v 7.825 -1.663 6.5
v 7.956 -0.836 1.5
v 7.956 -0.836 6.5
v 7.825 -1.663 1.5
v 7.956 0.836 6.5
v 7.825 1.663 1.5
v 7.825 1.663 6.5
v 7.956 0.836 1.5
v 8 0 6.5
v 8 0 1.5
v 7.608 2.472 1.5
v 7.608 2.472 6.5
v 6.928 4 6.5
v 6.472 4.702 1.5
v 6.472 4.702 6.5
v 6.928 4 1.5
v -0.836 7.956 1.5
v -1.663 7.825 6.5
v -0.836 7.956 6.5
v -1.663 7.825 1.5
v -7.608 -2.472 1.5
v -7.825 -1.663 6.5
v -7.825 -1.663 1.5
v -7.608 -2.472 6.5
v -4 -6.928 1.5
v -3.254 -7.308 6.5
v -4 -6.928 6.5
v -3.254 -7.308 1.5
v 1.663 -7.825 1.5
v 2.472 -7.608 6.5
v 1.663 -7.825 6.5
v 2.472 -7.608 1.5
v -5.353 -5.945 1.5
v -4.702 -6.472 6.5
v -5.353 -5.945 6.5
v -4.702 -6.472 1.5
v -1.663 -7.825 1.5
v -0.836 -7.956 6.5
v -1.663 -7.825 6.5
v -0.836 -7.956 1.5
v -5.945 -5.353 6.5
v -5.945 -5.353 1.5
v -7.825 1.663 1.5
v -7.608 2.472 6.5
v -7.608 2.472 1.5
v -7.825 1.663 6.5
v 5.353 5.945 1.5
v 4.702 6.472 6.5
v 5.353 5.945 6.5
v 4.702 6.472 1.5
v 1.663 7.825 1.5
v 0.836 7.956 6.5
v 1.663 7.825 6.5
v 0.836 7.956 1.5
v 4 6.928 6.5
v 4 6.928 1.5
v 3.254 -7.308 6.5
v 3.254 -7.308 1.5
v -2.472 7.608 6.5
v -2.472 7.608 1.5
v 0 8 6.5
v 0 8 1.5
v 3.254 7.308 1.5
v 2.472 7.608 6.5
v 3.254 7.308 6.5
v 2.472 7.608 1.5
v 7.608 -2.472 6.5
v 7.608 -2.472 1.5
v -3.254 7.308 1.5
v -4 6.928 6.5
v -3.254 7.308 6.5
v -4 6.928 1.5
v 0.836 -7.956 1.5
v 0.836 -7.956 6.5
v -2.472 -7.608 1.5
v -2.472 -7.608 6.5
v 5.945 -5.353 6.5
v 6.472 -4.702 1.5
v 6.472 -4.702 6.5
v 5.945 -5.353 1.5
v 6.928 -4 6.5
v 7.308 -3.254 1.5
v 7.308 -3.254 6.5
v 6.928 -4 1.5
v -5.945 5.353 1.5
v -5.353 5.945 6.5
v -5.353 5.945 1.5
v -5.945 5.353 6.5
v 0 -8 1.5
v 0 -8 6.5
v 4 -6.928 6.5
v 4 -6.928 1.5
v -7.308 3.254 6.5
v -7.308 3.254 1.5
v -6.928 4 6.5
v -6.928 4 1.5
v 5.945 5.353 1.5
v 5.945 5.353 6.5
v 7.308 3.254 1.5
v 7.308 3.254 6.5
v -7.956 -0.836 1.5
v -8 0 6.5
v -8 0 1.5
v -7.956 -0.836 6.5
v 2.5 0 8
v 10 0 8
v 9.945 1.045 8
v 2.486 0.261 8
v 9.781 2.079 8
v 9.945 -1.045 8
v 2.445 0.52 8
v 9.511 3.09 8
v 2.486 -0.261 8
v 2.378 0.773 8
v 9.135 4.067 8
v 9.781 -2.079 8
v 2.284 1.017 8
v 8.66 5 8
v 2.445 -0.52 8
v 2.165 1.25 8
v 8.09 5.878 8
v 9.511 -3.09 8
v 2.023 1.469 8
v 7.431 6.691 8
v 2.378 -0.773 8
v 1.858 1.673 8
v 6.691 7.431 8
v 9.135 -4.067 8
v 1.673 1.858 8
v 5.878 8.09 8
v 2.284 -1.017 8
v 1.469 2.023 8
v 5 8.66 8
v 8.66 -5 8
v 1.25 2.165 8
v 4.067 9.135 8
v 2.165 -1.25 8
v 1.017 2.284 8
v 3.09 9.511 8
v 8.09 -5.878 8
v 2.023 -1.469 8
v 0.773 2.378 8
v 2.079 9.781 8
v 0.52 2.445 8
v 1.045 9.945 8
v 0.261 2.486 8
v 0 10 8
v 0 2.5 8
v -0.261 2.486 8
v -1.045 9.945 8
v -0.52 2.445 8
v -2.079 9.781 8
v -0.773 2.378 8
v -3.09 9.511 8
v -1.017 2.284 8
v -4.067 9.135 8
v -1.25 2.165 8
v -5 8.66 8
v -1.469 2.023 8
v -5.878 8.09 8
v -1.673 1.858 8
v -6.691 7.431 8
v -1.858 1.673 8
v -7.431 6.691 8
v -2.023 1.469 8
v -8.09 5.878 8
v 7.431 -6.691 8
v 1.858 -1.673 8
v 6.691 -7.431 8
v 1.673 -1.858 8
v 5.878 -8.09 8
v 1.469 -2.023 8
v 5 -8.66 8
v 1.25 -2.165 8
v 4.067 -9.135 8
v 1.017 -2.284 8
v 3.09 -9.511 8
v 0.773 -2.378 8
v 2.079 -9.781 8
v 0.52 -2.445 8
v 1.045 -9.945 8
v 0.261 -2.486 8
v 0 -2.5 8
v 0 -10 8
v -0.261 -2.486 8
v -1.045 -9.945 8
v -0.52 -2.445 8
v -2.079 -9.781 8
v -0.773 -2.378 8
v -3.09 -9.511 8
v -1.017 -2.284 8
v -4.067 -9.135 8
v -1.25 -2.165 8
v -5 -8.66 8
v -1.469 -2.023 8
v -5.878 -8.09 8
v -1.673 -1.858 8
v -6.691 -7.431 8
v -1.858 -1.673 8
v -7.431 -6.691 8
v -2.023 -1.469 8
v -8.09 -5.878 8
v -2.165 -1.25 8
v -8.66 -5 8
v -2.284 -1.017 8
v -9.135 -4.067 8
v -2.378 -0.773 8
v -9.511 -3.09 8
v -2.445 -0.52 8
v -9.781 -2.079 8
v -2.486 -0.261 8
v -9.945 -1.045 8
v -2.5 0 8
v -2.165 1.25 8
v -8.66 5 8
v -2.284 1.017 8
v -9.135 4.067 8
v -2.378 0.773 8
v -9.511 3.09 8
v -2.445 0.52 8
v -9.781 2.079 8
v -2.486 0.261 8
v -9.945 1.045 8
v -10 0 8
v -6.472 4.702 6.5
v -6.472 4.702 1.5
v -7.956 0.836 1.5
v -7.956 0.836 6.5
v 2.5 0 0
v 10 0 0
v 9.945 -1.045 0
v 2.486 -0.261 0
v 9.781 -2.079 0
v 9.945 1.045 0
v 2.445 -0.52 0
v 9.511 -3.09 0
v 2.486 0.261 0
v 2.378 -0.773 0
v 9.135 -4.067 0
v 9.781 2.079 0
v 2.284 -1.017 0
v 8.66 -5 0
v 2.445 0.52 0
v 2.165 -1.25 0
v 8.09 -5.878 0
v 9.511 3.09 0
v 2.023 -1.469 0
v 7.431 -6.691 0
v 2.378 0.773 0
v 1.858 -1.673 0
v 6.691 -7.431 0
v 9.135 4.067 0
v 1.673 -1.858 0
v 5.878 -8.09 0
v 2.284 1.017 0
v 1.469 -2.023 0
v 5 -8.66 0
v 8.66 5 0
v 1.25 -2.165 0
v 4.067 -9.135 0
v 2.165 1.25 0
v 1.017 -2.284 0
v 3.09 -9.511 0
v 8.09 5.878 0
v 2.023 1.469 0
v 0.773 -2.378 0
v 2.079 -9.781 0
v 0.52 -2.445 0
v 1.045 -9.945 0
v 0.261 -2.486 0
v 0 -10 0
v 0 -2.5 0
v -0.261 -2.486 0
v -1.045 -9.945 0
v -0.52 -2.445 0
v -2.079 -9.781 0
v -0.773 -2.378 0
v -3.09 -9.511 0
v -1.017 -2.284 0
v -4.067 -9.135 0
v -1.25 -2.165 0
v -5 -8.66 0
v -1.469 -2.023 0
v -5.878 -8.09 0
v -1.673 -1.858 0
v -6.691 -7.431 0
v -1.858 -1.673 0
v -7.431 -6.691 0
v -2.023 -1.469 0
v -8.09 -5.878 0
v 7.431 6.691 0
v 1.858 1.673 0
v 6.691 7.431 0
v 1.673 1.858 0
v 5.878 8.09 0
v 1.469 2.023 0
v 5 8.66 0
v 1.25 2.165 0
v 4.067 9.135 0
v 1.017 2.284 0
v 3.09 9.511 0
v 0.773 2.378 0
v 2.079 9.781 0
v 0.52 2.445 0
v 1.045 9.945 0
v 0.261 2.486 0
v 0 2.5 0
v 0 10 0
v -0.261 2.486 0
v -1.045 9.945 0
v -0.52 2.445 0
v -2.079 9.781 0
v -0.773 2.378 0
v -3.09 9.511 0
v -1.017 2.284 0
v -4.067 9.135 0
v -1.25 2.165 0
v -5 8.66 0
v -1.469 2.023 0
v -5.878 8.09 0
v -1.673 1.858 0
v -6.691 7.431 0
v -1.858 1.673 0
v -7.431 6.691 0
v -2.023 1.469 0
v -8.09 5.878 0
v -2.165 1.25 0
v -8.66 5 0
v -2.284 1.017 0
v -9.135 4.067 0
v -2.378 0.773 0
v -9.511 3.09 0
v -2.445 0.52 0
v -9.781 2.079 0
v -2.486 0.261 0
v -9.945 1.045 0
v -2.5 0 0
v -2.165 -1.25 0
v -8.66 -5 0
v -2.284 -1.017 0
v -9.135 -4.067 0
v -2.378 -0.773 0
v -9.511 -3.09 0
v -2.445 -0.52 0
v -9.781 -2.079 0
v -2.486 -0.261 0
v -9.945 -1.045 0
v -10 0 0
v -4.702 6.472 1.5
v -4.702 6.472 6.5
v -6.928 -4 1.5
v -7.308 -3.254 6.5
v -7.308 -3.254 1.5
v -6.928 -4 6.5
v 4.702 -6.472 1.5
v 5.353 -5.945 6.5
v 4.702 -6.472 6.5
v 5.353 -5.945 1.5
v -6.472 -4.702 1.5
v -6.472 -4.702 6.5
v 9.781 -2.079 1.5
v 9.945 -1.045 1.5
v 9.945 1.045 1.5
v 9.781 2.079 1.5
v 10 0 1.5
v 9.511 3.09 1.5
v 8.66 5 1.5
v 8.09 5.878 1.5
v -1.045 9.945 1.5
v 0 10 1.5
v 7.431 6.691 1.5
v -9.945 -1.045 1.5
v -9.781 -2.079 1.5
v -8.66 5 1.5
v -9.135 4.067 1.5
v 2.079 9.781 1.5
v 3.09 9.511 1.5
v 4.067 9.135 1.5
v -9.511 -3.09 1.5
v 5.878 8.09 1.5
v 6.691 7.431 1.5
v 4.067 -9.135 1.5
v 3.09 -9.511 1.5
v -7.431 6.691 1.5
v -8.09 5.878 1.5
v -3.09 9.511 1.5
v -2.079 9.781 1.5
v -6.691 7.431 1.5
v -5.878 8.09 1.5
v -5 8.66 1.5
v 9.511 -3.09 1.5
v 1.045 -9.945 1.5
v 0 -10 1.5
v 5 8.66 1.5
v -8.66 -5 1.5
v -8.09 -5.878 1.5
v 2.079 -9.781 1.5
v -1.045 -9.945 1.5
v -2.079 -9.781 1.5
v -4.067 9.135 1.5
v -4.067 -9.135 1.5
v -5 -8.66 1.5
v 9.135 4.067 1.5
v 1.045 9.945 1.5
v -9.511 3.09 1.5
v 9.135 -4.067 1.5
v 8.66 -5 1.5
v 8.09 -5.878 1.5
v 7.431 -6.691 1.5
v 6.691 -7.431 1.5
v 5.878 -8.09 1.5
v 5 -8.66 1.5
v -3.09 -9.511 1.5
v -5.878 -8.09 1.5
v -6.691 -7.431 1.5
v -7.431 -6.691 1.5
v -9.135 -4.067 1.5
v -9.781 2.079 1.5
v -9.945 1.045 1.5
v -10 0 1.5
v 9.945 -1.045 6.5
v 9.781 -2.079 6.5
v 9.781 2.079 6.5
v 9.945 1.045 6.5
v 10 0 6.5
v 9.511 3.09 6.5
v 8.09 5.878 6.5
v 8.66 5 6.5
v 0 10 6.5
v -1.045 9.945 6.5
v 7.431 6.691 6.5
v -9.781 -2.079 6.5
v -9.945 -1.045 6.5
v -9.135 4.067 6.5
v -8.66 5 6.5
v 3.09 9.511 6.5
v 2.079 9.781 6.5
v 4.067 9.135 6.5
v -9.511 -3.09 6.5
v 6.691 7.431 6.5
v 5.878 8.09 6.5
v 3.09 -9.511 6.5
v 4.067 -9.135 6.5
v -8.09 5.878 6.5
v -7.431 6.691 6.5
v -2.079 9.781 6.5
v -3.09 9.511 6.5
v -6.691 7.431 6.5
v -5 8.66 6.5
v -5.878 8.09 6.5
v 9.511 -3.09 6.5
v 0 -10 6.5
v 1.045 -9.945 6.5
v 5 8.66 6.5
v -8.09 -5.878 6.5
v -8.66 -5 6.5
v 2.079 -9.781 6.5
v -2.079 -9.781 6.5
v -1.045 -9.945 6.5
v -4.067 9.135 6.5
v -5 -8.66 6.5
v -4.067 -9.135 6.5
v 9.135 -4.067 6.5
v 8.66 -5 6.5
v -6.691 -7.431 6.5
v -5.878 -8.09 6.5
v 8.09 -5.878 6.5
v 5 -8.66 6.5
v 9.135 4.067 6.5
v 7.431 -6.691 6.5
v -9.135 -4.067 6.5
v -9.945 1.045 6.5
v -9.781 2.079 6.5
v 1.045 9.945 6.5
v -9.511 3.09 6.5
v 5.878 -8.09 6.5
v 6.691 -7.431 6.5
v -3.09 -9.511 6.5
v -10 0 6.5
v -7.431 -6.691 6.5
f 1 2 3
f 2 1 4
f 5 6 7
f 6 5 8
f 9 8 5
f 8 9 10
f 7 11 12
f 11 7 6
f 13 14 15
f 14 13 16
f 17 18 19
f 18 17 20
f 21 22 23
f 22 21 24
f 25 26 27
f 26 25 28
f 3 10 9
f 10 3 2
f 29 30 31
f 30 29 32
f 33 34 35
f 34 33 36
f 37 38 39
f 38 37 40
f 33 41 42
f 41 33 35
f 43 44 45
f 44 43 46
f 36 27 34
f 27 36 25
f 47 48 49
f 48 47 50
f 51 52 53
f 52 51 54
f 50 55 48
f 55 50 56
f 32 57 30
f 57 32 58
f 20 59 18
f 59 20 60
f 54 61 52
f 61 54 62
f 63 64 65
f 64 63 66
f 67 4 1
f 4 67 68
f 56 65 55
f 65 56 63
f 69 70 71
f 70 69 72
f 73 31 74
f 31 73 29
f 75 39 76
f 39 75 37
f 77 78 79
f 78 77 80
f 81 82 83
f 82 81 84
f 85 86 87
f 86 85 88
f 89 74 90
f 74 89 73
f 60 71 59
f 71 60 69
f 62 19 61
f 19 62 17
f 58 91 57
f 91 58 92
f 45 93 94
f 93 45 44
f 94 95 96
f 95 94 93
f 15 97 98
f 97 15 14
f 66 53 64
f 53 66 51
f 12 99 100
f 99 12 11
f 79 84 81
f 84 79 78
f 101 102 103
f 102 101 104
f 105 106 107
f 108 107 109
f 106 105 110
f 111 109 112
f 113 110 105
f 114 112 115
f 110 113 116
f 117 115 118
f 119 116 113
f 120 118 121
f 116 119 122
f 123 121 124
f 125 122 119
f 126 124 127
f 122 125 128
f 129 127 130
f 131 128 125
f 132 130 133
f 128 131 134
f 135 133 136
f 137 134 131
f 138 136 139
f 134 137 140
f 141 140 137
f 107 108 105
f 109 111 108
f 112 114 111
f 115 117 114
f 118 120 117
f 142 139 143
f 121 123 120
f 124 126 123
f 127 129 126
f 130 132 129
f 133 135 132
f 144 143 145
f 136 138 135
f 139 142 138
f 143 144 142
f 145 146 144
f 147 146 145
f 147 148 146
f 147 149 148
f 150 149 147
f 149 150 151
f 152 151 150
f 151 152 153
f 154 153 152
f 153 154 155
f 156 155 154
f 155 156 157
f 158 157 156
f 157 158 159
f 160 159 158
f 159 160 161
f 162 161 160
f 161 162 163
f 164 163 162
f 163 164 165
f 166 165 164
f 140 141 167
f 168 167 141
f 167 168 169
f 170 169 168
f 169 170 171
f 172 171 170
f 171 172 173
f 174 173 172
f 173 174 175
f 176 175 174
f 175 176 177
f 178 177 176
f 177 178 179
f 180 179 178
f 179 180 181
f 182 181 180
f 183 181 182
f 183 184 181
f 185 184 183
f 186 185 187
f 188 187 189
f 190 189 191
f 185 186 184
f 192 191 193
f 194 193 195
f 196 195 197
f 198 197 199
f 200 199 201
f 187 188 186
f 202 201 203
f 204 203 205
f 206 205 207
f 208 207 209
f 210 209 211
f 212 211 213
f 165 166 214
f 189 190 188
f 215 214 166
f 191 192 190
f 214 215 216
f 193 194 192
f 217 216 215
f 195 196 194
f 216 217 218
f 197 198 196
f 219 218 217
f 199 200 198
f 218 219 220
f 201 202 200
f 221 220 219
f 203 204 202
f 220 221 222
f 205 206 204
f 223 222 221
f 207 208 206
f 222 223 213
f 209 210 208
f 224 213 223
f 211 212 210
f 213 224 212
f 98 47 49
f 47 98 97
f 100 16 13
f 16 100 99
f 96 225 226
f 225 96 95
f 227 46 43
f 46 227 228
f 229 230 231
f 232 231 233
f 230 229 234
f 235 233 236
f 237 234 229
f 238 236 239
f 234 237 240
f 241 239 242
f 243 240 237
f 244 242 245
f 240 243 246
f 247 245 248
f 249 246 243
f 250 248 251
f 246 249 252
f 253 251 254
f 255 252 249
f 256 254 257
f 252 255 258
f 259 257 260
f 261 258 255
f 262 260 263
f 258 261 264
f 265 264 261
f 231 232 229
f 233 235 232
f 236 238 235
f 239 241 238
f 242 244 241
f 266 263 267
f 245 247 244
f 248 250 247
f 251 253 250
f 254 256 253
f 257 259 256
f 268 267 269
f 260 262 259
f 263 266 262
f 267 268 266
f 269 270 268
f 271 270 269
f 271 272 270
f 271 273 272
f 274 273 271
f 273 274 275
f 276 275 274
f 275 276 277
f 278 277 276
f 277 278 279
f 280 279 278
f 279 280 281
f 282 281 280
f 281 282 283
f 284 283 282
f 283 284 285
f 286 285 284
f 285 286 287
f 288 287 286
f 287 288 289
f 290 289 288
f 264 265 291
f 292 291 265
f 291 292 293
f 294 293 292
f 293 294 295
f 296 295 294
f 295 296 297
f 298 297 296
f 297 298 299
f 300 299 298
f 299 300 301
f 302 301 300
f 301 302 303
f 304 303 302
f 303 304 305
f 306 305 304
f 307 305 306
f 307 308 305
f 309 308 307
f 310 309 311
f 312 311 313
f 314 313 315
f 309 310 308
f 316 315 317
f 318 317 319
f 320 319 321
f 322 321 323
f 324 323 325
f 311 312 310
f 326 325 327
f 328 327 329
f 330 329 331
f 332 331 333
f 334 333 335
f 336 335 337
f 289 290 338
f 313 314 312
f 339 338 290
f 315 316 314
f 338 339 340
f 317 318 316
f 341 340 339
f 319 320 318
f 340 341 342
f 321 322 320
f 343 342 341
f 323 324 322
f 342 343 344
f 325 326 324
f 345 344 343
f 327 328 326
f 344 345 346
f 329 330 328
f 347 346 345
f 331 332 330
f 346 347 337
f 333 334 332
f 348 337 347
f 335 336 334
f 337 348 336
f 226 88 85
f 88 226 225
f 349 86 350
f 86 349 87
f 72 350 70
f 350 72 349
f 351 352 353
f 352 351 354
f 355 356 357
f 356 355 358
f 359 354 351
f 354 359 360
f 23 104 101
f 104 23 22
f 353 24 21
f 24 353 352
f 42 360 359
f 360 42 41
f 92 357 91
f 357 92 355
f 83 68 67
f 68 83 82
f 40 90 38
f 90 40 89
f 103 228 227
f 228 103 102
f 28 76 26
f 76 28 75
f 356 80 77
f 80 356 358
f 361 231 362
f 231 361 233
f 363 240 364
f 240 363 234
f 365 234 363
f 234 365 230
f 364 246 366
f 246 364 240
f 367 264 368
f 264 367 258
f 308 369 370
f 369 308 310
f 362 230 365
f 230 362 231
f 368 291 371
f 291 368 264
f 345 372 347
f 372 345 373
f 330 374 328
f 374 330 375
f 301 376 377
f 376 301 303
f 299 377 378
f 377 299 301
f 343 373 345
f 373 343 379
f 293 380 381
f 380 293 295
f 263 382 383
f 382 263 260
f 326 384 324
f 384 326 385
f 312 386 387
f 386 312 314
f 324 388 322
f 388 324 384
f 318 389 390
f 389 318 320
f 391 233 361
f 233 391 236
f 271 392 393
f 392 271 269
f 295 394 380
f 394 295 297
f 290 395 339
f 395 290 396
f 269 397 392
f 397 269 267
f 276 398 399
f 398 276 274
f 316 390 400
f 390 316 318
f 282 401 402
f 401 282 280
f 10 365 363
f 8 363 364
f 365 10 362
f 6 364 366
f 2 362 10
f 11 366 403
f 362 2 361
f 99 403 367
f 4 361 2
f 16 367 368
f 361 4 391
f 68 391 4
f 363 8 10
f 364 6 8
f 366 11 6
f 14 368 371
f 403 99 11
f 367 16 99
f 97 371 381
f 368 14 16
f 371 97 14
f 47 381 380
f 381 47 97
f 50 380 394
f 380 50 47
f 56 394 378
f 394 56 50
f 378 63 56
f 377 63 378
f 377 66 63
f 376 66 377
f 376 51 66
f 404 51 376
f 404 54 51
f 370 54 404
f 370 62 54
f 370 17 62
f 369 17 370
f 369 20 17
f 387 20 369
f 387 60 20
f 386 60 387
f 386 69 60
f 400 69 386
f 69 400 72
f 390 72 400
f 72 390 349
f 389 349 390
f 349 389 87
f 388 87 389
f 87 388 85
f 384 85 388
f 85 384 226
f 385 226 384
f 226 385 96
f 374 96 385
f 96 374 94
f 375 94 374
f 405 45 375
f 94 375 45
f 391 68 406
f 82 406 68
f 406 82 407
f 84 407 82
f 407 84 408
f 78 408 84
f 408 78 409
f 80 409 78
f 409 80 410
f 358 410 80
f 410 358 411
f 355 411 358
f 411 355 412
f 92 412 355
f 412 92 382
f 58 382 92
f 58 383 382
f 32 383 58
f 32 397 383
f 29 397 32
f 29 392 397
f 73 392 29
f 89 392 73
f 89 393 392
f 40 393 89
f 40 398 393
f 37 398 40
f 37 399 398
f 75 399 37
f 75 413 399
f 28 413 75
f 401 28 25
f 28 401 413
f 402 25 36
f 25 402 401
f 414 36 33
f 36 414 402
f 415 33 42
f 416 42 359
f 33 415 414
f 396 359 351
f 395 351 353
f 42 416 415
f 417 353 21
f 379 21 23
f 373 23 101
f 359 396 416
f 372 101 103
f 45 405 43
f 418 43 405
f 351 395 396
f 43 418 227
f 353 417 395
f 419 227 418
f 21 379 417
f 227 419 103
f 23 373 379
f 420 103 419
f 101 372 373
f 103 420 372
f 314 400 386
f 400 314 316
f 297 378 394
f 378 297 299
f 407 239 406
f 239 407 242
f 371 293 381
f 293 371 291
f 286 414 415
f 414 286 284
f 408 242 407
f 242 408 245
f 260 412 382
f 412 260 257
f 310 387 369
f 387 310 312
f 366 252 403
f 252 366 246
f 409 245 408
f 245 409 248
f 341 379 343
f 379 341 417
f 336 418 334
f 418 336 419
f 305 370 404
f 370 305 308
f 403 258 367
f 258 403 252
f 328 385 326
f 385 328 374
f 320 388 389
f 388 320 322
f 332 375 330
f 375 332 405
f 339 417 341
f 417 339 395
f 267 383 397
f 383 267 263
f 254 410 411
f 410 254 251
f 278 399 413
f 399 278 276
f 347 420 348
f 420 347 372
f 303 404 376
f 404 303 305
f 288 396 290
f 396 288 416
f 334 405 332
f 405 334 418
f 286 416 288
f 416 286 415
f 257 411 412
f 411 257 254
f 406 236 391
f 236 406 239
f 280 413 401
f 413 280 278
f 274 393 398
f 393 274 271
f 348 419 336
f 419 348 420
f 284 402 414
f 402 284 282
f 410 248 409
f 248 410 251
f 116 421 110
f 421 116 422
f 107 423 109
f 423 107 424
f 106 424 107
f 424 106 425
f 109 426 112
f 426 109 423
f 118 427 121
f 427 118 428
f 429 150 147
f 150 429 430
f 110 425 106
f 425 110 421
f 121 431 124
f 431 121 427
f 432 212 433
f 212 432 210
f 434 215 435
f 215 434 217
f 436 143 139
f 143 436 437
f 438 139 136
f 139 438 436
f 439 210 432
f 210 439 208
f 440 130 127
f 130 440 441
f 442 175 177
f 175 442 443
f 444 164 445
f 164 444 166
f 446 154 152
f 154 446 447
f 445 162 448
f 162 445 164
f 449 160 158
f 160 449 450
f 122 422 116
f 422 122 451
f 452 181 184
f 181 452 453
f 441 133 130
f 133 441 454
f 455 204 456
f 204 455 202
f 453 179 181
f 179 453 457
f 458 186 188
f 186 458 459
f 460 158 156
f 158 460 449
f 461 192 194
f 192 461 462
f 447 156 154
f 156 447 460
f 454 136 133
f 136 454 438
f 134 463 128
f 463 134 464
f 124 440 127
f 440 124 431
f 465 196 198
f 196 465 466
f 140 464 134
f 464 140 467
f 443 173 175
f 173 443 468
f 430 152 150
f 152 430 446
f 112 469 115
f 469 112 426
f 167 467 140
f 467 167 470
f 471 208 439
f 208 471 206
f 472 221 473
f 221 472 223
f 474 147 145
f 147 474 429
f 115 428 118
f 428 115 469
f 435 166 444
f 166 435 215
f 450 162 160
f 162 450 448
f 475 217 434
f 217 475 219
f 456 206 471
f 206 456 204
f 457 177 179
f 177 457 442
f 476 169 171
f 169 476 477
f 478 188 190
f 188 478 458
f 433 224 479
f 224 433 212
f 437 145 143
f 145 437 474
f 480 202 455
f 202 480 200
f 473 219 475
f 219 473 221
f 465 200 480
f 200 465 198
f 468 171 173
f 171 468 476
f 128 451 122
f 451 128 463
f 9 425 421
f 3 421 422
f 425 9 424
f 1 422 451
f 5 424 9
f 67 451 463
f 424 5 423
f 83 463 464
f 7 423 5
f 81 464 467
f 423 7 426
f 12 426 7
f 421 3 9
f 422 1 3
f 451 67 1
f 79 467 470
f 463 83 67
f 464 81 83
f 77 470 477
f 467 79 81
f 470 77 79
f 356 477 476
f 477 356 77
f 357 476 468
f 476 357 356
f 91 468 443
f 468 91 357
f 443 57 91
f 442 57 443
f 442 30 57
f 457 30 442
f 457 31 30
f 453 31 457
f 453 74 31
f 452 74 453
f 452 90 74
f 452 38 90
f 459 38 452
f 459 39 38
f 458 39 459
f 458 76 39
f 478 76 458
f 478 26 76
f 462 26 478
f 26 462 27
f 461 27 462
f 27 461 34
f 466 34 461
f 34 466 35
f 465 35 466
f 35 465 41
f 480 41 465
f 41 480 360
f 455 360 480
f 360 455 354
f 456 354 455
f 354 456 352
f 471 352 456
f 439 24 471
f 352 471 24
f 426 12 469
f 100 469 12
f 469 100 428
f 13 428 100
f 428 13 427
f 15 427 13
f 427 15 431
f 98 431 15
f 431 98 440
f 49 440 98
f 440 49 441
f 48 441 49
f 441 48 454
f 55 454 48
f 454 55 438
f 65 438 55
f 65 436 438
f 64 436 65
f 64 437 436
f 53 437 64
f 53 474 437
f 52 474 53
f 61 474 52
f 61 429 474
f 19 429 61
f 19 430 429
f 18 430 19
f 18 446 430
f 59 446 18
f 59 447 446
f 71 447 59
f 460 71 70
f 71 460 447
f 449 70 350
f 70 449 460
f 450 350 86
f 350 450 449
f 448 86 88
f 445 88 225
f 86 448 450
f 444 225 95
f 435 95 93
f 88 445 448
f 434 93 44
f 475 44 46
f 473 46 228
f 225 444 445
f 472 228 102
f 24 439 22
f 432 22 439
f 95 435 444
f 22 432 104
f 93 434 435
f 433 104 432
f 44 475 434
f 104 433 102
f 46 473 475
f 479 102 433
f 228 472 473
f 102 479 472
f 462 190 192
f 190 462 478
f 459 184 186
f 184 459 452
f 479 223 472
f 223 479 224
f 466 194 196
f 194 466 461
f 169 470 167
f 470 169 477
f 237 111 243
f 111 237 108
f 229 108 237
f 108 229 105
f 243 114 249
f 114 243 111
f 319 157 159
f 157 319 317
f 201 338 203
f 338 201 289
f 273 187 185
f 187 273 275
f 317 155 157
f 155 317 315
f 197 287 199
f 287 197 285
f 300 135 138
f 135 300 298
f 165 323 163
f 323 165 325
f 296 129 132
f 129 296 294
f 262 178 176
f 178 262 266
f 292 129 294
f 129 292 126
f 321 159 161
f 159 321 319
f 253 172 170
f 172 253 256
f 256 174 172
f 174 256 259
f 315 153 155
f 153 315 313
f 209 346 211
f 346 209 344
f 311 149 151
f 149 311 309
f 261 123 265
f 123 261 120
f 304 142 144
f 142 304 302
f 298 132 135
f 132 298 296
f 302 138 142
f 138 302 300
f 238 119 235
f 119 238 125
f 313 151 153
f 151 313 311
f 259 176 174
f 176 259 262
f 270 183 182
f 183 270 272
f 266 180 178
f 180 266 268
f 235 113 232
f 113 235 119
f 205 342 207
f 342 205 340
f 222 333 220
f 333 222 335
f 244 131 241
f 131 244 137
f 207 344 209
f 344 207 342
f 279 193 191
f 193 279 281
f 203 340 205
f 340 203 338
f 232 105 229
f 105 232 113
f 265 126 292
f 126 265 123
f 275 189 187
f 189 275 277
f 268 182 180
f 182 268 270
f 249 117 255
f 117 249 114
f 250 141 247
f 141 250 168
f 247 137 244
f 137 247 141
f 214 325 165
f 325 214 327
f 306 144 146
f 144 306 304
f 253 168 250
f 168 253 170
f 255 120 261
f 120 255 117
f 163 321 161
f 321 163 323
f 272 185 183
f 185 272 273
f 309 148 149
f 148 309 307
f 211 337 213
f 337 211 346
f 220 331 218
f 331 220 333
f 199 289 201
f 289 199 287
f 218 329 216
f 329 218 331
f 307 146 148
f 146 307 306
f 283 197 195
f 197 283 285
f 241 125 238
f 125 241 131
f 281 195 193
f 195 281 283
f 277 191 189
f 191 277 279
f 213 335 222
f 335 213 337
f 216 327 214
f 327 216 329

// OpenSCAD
// Plain idler pulley with retaining flanges.
$fn = 60;
eps = 0.02;
bore_d = 5;
body_d = 16;
width = 8;
flange_t = 1.5;
difference() {
    union() {
        cylinder(d=body_d,h=width);
        cylinder(d=body_d+4,h=flange_t);
        translate([0,0,width-flange_t]) cylinder(d=body_d+4,h=flange_t);
    }
    translate([0,0,-eps]) cylinder(d=bore_d,h=width+2*eps);
}
